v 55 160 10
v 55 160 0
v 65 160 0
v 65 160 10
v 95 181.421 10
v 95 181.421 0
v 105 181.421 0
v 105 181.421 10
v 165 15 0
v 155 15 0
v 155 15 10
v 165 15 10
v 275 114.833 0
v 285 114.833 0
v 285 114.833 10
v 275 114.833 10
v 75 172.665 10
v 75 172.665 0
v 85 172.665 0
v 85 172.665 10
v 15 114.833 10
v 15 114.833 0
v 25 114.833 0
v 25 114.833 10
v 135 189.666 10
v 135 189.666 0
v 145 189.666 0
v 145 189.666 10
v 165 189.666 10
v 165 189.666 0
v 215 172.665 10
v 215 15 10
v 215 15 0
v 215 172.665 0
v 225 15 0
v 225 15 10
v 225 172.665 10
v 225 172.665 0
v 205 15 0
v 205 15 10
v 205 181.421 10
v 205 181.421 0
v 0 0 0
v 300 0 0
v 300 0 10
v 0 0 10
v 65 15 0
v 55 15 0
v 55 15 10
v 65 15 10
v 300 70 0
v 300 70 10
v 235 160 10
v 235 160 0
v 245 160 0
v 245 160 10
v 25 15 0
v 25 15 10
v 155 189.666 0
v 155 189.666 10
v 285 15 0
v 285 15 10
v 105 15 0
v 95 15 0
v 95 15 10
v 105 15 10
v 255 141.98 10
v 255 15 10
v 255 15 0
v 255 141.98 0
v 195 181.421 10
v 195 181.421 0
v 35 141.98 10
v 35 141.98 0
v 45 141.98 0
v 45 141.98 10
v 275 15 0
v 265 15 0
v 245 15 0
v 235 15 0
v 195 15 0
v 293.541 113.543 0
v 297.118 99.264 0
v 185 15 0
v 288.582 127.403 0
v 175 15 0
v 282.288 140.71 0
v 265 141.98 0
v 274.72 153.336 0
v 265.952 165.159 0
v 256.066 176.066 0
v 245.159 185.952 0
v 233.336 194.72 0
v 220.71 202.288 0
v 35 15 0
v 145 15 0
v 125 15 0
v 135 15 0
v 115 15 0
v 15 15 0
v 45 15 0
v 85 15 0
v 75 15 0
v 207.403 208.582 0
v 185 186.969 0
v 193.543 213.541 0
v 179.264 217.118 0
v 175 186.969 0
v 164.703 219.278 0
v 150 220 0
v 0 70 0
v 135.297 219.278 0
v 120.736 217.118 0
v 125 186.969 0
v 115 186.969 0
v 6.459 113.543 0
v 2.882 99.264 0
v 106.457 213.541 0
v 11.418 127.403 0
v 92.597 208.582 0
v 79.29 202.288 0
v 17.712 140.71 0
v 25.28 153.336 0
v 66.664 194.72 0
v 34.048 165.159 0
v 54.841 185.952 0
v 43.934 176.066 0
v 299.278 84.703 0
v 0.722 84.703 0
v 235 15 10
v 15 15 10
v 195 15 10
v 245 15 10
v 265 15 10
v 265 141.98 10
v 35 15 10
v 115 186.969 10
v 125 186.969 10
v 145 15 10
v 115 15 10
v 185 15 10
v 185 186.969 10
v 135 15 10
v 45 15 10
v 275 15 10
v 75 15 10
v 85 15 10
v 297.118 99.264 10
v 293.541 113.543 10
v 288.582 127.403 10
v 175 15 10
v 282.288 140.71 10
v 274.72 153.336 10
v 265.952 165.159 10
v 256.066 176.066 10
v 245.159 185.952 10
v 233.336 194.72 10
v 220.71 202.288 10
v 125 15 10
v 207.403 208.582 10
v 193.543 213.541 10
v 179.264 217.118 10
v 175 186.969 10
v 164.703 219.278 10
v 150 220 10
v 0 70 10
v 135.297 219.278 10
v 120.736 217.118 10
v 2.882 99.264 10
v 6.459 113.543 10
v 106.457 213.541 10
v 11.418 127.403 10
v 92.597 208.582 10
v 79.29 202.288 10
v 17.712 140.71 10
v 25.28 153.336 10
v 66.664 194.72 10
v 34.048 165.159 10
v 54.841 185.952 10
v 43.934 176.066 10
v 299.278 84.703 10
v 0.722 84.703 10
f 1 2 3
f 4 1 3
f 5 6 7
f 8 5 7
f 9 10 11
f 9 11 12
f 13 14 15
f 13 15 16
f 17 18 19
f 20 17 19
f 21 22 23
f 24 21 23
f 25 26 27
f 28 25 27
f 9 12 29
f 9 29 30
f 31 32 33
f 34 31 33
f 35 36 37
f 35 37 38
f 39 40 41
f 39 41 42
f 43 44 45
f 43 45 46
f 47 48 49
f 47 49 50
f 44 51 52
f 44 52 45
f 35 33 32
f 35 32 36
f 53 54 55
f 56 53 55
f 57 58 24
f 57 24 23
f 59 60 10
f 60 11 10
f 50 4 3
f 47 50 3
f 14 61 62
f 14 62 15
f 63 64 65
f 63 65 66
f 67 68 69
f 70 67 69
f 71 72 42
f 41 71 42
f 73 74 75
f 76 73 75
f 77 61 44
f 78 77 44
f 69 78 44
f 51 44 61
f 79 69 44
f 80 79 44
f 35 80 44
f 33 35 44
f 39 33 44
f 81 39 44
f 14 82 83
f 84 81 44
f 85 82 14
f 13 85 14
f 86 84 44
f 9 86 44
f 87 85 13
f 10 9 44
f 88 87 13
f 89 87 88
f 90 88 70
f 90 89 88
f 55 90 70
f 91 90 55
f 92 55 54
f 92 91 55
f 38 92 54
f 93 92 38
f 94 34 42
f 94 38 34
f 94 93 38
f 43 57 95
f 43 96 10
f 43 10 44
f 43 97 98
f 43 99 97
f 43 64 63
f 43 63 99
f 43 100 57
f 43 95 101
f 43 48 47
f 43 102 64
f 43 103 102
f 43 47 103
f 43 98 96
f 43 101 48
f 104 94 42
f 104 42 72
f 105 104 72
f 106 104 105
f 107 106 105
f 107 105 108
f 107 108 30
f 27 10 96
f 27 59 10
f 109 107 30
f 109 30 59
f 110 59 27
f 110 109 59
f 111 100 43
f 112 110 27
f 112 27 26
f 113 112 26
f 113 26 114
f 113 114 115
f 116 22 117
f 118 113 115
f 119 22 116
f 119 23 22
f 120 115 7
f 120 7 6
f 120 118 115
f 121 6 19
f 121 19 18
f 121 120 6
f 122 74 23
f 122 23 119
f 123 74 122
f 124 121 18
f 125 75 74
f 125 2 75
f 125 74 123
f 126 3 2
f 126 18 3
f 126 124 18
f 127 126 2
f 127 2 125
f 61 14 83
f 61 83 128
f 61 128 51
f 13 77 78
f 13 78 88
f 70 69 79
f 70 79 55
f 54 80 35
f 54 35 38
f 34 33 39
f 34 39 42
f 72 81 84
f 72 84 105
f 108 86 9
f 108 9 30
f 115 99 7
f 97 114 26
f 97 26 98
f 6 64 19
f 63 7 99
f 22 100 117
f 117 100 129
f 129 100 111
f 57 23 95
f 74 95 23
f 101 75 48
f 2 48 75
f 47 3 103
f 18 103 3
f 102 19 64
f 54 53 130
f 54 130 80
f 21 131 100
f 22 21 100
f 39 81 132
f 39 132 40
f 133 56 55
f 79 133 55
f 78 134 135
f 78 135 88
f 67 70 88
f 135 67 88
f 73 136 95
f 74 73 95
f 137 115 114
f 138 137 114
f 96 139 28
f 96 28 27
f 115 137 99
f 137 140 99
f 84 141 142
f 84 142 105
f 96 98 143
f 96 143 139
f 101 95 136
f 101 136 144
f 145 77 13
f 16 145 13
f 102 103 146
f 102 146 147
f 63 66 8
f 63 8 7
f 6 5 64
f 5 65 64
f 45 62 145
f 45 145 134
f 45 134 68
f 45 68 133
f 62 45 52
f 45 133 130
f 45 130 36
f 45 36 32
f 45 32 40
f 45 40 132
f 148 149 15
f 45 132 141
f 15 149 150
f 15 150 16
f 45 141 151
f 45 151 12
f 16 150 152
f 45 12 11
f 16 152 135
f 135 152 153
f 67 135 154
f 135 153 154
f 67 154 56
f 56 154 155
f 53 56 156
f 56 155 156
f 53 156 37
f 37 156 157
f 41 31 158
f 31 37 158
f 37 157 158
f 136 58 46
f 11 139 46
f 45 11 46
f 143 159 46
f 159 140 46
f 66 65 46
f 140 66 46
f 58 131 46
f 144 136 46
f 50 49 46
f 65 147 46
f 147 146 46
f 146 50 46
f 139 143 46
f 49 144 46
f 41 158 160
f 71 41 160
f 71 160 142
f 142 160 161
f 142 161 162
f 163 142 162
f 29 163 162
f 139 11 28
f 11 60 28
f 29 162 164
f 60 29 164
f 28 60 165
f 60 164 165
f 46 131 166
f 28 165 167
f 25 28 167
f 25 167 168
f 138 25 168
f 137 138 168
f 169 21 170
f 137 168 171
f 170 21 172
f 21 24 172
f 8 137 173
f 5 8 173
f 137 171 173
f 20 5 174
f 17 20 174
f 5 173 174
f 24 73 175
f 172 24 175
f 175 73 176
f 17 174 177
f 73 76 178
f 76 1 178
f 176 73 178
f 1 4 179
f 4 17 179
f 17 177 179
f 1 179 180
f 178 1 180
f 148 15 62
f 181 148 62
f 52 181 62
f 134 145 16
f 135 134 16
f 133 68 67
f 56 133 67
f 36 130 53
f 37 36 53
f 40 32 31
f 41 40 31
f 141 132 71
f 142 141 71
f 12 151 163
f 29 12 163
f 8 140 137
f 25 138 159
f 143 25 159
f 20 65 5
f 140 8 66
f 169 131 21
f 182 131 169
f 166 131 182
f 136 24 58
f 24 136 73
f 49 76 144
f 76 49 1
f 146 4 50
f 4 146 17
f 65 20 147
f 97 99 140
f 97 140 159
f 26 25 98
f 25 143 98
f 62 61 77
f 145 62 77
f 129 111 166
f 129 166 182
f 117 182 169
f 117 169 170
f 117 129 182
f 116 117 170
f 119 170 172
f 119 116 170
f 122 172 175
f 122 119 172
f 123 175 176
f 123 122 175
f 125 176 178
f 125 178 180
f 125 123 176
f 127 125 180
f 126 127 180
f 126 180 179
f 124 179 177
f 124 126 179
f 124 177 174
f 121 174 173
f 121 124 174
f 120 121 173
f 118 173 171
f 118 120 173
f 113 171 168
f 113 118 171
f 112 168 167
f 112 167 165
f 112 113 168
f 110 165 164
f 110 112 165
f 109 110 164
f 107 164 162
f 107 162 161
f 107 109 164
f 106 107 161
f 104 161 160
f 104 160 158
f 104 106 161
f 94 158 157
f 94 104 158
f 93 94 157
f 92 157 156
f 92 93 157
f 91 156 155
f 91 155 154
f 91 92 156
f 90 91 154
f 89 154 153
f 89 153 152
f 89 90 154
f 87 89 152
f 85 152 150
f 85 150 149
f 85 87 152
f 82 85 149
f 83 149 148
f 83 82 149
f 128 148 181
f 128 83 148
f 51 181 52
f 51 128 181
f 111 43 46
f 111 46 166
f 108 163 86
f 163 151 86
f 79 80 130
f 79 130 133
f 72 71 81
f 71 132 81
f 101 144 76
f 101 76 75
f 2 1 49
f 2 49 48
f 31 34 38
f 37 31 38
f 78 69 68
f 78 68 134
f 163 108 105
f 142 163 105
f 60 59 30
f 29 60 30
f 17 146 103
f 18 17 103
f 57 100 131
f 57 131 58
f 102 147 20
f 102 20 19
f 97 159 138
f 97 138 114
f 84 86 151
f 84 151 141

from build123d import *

# Parameters (mm, degrees)
P_IDAT_VYSUNUT_M1_DEPTH  = 10
ODEBRAT_VYSUNUT_M1_REACH = 374.156
SKICA2_W                 = 10
SKICA2_H                 = 99.833147735
LINPOLE2_START           = 15
LINPOLE2_OUTLINE_W       = 10
LINPOLE2_OUTLINE_H       = 10
LINPOLE2_DEPTH           = 126.980390272
LINPOLE2_START_2         = 141.980390272
LINPOLE2_2_OUTLINE_W     = 10
LINPOLE2_2_OUTLINE_H     = 10
LINPOLE2_2_DEPTH         = 30.684601342
LINPOLE2_3_OUTLINE_W     = 10
LINPOLE2_3_OUTLINE_H     = 10
LINPOLE2_3_DEPTH         = 99.833147735
LINPOLE2_START_3         = 172.664991614
LINPOLE2_4_OUTLINE_W     = 10
LINPOLE2_4_OUTLINE_H     = 10
LINPOLE2_4_DEPTH         = 14.304392953
LINPOLE2_5_OUTLINE_W     = 10
LINPOLE2_5_OUTLINE_H     = 10
LINPOLE2_5_DEPTH         = 18.019609728
LINPOLE2_6_OUTLINE_W     = 10
LINPOLE2_6_OUTLINE_H     = 10
LINPOLE2_6_DEPTH         = 8.756364623
LINPOLE2_START_4         = 186.969384567
LINPOLE2_7_OUTLINE_W     = 10
LINPOLE2_7_OUTLINE_H     = 10
LINPOLE2_7_DEPTH         = 2.696910904


# Read off the part's stored shape, not the designer's step: LinPole2
with BuildPart() as part:
    # Skica1 → Přidat vysunutím1 (new body)
    with BuildSketch(Plane.XY):
        with BuildLine():
            Line((0, 0), (0, 70))
            ThreePointArc((0, 70), (150, 220), (300, 70))
            Line((300, 70), (300, 0))
            Line((300, 0), (0, 0))
        make_face()
    extrude(amount=P_IDAT_VYSUNUT_M1_DEPTH)

    # Skica2 → Odebrat vysunutím1 (cut, up to next)
    with BuildSketch(Plane(origin=(0, 0, 0), x_dir=(-1, 0, 0), z_dir=(0, 0, -1)), mode=Mode.PRIVATE) as odebrat_vysunut_m1_sk1:
        with Locations((-280, 64.916573868)):
            Rectangle(SKICA2_W, SKICA2_H)
    odebrat_vysunut_m1_tool1 = extrude(odebrat_vysunut_m1_sk1.sketch, amount=-ODEBRAT_VYSUNUT_M1_REACH, mode=Mode.PRIVATE) & part.part
    add(odebrat_vysunut_m1_tool1.solids().sort_by_distance((280, 64.916574, 0))[0], mode=Mode.SUBTRACT)

    # LinPole2 outline → LinPole2 (cut)
    with BuildSketch(Plane(origin=(0, 0, 0), x_dir=(1, 0, 0), z_dir=(0, 1, 0)).offset(LINPOLE2_START)):
        with Locations((40, -5)):
            Rectangle(LINPOLE2_OUTLINE_W, LINPOLE2_OUTLINE_H)
        with Locations((60, -5)):
            Rectangle(LINPOLE2_OUTLINE_W, LINPOLE2_OUTLINE_H)
        with Locations((80, -5)):
            Rectangle(LINPOLE2_OUTLINE_W, LINPOLE2_OUTLINE_H)
        with Locations((100, -5)):
            Rectangle(LINPOLE2_OUTLINE_W, LINPOLE2_OUTLINE_H)
        with Locations((120, -5)):
            Rectangle(LINPOLE2_OUTLINE_W, LINPOLE2_OUTLINE_H)
        with Locations((140, -5)):
            Rectangle(LINPOLE2_OUTLINE_W, LINPOLE2_OUTLINE_H)
        with Locations((160, -5)):
            Rectangle(LINPOLE2_OUTLINE_W, LINPOLE2_OUTLINE_H)
        with Locations((180, -5)):
            Rectangle(LINPOLE2_OUTLINE_W, LINPOLE2_OUTLINE_H)
        with Locations((200, -5)):
            Rectangle(LINPOLE2_OUTLINE_W, LINPOLE2_OUTLINE_H)
        with Locations((220, -5)):
            Rectangle(LINPOLE2_OUTLINE_W, LINPOLE2_OUTLINE_H)
        with Locations((240, -5)):
            Rectangle(LINPOLE2_OUTLINE_W, LINPOLE2_OUTLINE_H)
        with Locations((260, -5)):
            Rectangle(LINPOLE2_OUTLINE_W, LINPOLE2_OUTLINE_H)
    extrude(amount=LINPOLE2_DEPTH, mode=Mode.SUBTRACT)

    # LinPole2 2 outline → LinPole2 2 (cut)
    with BuildSketch(Plane(origin=(0, 0, 0), x_dir=(1, 0, 0), z_dir=(0, 1, 0)).offset(LINPOLE2_START_2)):
        with Locations((80, -5)):
            Rectangle(LINPOLE2_2_OUTLINE_W, LINPOLE2_2_OUTLINE_H)
        with Locations((100, -5)):
            Rectangle(LINPOLE2_2_OUTLINE_W, LINPOLE2_2_OUTLINE_H)
        with Locations((120, -5)):
            Rectangle(LINPOLE2_2_OUTLINE_W, LINPOLE2_2_OUTLINE_H)
        with Locations((140, -5)):
            Rectangle(LINPOLE2_2_OUTLINE_W, LINPOLE2_2_OUTLINE_H)
        with Locations((160, -5)):
            Rectangle(LINPOLE2_2_OUTLINE_W, LINPOLE2_2_OUTLINE_H)
        with Locations((180, -5)):
            Rectangle(LINPOLE2_2_OUTLINE_W, LINPOLE2_2_OUTLINE_H)
        with Locations((200, -5)):
            Rectangle(LINPOLE2_2_OUTLINE_W, LINPOLE2_2_OUTLINE_H)
        with Locations((220, -5)):
            Rectangle(LINPOLE2_2_OUTLINE_W, LINPOLE2_2_OUTLINE_H)
    extrude(amount=LINPOLE2_2_DEPTH, mode=Mode.SUBTRACT)

    # LinPole2 3 outline → LinPole2 3 (cut)
    with BuildSketch(Plane(origin=(0, 0, 0), x_dir=(1, 0, 0), z_dir=(0, 1, 0)).offset(LINPOLE2_START)):
        with Locations((20, -5)):
            Rectangle(LINPOLE2_3_OUTLINE_W, LINPOLE2_3_OUTLINE_H)
    extrude(amount=LINPOLE2_3_DEPTH, mode=Mode.SUBTRACT)

    # LinPole2 4 outline → LinPole2 4 (cut)
    with BuildSketch(Plane(origin=(0, 0, 0), x_dir=(1, 0, 0), z_dir=(0, 1, 0)).offset(LINPOLE2_START_3)):
        with Locations((120, -5)):
            Rectangle(LINPOLE2_4_OUTLINE_W, LINPOLE2_4_OUTLINE_H)
        with Locations((140, -5)):
            Rectangle(LINPOLE2_4_OUTLINE_W, LINPOLE2_4_OUTLINE_H)
        with Locations((160, -5)):
            Rectangle(LINPOLE2_4_OUTLINE_W, LINPOLE2_4_OUTLINE_H)
        with Locations((180, -5)):
            Rectangle(LINPOLE2_4_OUTLINE_W, LINPOLE2_4_OUTLINE_H)
    extrude(amount=LINPOLE2_4_DEPTH, mode=Mode.SUBTRACT)

    # LinPole2 5 outline → LinPole2 5 (cut)
    with BuildSketch(Plane(origin=(0, 0, 0), x_dir=(1, 0, 0), z_dir=(0, 1, 0)).offset(LINPOLE2_START_2)):
        with Locations((60, -5)):
            Rectangle(LINPOLE2_5_OUTLINE_W, LINPOLE2_5_OUTLINE_H)
        with Locations((240, -5)):
            Rectangle(LINPOLE2_5_OUTLINE_W, LINPOLE2_5_OUTLINE_H)
    extrude(amount=LINPOLE2_5_DEPTH, mode=Mode.SUBTRACT)

    # LinPole2 6 outline → LinPole2 6 (cut)
    with BuildSketch(Plane(origin=(0, 0, 0), x_dir=(1, 0, 0), z_dir=(0, 1, 0)).offset(LINPOLE2_START_3)):
        with Locations((100, -5)):
            Rectangle(LINPOLE2_6_OUTLINE_W, LINPOLE2_6_OUTLINE_H)
        with Locations((200, -5)):
            Rectangle(LINPOLE2_6_OUTLINE_W, LINPOLE2_6_OUTLINE_H)
    extrude(amount=LINPOLE2_6_DEPTH, mode=Mode.SUBTRACT)

    # LinPole2 7 outline → LinPole2 7 (cut)
    with BuildSketch(Plane(origin=(0, 0, 0), x_dir=(1, 0, 0), z_dir=(0, 1, 0)).offset(LINPOLE2_START_4)):
        with Locations((140, -5)):
            Rectangle(LINPOLE2_7_OUTLINE_W, LINPOLE2_7_OUTLINE_H)
        with Locations((160, -5)):
            Rectangle(LINPOLE2_7_OUTLINE_W, LINPOLE2_7_OUTLINE_H)
    extrude(amount=LINPOLE2_7_DEPTH, mode=Mode.SUBTRACT)


solid = part.part
